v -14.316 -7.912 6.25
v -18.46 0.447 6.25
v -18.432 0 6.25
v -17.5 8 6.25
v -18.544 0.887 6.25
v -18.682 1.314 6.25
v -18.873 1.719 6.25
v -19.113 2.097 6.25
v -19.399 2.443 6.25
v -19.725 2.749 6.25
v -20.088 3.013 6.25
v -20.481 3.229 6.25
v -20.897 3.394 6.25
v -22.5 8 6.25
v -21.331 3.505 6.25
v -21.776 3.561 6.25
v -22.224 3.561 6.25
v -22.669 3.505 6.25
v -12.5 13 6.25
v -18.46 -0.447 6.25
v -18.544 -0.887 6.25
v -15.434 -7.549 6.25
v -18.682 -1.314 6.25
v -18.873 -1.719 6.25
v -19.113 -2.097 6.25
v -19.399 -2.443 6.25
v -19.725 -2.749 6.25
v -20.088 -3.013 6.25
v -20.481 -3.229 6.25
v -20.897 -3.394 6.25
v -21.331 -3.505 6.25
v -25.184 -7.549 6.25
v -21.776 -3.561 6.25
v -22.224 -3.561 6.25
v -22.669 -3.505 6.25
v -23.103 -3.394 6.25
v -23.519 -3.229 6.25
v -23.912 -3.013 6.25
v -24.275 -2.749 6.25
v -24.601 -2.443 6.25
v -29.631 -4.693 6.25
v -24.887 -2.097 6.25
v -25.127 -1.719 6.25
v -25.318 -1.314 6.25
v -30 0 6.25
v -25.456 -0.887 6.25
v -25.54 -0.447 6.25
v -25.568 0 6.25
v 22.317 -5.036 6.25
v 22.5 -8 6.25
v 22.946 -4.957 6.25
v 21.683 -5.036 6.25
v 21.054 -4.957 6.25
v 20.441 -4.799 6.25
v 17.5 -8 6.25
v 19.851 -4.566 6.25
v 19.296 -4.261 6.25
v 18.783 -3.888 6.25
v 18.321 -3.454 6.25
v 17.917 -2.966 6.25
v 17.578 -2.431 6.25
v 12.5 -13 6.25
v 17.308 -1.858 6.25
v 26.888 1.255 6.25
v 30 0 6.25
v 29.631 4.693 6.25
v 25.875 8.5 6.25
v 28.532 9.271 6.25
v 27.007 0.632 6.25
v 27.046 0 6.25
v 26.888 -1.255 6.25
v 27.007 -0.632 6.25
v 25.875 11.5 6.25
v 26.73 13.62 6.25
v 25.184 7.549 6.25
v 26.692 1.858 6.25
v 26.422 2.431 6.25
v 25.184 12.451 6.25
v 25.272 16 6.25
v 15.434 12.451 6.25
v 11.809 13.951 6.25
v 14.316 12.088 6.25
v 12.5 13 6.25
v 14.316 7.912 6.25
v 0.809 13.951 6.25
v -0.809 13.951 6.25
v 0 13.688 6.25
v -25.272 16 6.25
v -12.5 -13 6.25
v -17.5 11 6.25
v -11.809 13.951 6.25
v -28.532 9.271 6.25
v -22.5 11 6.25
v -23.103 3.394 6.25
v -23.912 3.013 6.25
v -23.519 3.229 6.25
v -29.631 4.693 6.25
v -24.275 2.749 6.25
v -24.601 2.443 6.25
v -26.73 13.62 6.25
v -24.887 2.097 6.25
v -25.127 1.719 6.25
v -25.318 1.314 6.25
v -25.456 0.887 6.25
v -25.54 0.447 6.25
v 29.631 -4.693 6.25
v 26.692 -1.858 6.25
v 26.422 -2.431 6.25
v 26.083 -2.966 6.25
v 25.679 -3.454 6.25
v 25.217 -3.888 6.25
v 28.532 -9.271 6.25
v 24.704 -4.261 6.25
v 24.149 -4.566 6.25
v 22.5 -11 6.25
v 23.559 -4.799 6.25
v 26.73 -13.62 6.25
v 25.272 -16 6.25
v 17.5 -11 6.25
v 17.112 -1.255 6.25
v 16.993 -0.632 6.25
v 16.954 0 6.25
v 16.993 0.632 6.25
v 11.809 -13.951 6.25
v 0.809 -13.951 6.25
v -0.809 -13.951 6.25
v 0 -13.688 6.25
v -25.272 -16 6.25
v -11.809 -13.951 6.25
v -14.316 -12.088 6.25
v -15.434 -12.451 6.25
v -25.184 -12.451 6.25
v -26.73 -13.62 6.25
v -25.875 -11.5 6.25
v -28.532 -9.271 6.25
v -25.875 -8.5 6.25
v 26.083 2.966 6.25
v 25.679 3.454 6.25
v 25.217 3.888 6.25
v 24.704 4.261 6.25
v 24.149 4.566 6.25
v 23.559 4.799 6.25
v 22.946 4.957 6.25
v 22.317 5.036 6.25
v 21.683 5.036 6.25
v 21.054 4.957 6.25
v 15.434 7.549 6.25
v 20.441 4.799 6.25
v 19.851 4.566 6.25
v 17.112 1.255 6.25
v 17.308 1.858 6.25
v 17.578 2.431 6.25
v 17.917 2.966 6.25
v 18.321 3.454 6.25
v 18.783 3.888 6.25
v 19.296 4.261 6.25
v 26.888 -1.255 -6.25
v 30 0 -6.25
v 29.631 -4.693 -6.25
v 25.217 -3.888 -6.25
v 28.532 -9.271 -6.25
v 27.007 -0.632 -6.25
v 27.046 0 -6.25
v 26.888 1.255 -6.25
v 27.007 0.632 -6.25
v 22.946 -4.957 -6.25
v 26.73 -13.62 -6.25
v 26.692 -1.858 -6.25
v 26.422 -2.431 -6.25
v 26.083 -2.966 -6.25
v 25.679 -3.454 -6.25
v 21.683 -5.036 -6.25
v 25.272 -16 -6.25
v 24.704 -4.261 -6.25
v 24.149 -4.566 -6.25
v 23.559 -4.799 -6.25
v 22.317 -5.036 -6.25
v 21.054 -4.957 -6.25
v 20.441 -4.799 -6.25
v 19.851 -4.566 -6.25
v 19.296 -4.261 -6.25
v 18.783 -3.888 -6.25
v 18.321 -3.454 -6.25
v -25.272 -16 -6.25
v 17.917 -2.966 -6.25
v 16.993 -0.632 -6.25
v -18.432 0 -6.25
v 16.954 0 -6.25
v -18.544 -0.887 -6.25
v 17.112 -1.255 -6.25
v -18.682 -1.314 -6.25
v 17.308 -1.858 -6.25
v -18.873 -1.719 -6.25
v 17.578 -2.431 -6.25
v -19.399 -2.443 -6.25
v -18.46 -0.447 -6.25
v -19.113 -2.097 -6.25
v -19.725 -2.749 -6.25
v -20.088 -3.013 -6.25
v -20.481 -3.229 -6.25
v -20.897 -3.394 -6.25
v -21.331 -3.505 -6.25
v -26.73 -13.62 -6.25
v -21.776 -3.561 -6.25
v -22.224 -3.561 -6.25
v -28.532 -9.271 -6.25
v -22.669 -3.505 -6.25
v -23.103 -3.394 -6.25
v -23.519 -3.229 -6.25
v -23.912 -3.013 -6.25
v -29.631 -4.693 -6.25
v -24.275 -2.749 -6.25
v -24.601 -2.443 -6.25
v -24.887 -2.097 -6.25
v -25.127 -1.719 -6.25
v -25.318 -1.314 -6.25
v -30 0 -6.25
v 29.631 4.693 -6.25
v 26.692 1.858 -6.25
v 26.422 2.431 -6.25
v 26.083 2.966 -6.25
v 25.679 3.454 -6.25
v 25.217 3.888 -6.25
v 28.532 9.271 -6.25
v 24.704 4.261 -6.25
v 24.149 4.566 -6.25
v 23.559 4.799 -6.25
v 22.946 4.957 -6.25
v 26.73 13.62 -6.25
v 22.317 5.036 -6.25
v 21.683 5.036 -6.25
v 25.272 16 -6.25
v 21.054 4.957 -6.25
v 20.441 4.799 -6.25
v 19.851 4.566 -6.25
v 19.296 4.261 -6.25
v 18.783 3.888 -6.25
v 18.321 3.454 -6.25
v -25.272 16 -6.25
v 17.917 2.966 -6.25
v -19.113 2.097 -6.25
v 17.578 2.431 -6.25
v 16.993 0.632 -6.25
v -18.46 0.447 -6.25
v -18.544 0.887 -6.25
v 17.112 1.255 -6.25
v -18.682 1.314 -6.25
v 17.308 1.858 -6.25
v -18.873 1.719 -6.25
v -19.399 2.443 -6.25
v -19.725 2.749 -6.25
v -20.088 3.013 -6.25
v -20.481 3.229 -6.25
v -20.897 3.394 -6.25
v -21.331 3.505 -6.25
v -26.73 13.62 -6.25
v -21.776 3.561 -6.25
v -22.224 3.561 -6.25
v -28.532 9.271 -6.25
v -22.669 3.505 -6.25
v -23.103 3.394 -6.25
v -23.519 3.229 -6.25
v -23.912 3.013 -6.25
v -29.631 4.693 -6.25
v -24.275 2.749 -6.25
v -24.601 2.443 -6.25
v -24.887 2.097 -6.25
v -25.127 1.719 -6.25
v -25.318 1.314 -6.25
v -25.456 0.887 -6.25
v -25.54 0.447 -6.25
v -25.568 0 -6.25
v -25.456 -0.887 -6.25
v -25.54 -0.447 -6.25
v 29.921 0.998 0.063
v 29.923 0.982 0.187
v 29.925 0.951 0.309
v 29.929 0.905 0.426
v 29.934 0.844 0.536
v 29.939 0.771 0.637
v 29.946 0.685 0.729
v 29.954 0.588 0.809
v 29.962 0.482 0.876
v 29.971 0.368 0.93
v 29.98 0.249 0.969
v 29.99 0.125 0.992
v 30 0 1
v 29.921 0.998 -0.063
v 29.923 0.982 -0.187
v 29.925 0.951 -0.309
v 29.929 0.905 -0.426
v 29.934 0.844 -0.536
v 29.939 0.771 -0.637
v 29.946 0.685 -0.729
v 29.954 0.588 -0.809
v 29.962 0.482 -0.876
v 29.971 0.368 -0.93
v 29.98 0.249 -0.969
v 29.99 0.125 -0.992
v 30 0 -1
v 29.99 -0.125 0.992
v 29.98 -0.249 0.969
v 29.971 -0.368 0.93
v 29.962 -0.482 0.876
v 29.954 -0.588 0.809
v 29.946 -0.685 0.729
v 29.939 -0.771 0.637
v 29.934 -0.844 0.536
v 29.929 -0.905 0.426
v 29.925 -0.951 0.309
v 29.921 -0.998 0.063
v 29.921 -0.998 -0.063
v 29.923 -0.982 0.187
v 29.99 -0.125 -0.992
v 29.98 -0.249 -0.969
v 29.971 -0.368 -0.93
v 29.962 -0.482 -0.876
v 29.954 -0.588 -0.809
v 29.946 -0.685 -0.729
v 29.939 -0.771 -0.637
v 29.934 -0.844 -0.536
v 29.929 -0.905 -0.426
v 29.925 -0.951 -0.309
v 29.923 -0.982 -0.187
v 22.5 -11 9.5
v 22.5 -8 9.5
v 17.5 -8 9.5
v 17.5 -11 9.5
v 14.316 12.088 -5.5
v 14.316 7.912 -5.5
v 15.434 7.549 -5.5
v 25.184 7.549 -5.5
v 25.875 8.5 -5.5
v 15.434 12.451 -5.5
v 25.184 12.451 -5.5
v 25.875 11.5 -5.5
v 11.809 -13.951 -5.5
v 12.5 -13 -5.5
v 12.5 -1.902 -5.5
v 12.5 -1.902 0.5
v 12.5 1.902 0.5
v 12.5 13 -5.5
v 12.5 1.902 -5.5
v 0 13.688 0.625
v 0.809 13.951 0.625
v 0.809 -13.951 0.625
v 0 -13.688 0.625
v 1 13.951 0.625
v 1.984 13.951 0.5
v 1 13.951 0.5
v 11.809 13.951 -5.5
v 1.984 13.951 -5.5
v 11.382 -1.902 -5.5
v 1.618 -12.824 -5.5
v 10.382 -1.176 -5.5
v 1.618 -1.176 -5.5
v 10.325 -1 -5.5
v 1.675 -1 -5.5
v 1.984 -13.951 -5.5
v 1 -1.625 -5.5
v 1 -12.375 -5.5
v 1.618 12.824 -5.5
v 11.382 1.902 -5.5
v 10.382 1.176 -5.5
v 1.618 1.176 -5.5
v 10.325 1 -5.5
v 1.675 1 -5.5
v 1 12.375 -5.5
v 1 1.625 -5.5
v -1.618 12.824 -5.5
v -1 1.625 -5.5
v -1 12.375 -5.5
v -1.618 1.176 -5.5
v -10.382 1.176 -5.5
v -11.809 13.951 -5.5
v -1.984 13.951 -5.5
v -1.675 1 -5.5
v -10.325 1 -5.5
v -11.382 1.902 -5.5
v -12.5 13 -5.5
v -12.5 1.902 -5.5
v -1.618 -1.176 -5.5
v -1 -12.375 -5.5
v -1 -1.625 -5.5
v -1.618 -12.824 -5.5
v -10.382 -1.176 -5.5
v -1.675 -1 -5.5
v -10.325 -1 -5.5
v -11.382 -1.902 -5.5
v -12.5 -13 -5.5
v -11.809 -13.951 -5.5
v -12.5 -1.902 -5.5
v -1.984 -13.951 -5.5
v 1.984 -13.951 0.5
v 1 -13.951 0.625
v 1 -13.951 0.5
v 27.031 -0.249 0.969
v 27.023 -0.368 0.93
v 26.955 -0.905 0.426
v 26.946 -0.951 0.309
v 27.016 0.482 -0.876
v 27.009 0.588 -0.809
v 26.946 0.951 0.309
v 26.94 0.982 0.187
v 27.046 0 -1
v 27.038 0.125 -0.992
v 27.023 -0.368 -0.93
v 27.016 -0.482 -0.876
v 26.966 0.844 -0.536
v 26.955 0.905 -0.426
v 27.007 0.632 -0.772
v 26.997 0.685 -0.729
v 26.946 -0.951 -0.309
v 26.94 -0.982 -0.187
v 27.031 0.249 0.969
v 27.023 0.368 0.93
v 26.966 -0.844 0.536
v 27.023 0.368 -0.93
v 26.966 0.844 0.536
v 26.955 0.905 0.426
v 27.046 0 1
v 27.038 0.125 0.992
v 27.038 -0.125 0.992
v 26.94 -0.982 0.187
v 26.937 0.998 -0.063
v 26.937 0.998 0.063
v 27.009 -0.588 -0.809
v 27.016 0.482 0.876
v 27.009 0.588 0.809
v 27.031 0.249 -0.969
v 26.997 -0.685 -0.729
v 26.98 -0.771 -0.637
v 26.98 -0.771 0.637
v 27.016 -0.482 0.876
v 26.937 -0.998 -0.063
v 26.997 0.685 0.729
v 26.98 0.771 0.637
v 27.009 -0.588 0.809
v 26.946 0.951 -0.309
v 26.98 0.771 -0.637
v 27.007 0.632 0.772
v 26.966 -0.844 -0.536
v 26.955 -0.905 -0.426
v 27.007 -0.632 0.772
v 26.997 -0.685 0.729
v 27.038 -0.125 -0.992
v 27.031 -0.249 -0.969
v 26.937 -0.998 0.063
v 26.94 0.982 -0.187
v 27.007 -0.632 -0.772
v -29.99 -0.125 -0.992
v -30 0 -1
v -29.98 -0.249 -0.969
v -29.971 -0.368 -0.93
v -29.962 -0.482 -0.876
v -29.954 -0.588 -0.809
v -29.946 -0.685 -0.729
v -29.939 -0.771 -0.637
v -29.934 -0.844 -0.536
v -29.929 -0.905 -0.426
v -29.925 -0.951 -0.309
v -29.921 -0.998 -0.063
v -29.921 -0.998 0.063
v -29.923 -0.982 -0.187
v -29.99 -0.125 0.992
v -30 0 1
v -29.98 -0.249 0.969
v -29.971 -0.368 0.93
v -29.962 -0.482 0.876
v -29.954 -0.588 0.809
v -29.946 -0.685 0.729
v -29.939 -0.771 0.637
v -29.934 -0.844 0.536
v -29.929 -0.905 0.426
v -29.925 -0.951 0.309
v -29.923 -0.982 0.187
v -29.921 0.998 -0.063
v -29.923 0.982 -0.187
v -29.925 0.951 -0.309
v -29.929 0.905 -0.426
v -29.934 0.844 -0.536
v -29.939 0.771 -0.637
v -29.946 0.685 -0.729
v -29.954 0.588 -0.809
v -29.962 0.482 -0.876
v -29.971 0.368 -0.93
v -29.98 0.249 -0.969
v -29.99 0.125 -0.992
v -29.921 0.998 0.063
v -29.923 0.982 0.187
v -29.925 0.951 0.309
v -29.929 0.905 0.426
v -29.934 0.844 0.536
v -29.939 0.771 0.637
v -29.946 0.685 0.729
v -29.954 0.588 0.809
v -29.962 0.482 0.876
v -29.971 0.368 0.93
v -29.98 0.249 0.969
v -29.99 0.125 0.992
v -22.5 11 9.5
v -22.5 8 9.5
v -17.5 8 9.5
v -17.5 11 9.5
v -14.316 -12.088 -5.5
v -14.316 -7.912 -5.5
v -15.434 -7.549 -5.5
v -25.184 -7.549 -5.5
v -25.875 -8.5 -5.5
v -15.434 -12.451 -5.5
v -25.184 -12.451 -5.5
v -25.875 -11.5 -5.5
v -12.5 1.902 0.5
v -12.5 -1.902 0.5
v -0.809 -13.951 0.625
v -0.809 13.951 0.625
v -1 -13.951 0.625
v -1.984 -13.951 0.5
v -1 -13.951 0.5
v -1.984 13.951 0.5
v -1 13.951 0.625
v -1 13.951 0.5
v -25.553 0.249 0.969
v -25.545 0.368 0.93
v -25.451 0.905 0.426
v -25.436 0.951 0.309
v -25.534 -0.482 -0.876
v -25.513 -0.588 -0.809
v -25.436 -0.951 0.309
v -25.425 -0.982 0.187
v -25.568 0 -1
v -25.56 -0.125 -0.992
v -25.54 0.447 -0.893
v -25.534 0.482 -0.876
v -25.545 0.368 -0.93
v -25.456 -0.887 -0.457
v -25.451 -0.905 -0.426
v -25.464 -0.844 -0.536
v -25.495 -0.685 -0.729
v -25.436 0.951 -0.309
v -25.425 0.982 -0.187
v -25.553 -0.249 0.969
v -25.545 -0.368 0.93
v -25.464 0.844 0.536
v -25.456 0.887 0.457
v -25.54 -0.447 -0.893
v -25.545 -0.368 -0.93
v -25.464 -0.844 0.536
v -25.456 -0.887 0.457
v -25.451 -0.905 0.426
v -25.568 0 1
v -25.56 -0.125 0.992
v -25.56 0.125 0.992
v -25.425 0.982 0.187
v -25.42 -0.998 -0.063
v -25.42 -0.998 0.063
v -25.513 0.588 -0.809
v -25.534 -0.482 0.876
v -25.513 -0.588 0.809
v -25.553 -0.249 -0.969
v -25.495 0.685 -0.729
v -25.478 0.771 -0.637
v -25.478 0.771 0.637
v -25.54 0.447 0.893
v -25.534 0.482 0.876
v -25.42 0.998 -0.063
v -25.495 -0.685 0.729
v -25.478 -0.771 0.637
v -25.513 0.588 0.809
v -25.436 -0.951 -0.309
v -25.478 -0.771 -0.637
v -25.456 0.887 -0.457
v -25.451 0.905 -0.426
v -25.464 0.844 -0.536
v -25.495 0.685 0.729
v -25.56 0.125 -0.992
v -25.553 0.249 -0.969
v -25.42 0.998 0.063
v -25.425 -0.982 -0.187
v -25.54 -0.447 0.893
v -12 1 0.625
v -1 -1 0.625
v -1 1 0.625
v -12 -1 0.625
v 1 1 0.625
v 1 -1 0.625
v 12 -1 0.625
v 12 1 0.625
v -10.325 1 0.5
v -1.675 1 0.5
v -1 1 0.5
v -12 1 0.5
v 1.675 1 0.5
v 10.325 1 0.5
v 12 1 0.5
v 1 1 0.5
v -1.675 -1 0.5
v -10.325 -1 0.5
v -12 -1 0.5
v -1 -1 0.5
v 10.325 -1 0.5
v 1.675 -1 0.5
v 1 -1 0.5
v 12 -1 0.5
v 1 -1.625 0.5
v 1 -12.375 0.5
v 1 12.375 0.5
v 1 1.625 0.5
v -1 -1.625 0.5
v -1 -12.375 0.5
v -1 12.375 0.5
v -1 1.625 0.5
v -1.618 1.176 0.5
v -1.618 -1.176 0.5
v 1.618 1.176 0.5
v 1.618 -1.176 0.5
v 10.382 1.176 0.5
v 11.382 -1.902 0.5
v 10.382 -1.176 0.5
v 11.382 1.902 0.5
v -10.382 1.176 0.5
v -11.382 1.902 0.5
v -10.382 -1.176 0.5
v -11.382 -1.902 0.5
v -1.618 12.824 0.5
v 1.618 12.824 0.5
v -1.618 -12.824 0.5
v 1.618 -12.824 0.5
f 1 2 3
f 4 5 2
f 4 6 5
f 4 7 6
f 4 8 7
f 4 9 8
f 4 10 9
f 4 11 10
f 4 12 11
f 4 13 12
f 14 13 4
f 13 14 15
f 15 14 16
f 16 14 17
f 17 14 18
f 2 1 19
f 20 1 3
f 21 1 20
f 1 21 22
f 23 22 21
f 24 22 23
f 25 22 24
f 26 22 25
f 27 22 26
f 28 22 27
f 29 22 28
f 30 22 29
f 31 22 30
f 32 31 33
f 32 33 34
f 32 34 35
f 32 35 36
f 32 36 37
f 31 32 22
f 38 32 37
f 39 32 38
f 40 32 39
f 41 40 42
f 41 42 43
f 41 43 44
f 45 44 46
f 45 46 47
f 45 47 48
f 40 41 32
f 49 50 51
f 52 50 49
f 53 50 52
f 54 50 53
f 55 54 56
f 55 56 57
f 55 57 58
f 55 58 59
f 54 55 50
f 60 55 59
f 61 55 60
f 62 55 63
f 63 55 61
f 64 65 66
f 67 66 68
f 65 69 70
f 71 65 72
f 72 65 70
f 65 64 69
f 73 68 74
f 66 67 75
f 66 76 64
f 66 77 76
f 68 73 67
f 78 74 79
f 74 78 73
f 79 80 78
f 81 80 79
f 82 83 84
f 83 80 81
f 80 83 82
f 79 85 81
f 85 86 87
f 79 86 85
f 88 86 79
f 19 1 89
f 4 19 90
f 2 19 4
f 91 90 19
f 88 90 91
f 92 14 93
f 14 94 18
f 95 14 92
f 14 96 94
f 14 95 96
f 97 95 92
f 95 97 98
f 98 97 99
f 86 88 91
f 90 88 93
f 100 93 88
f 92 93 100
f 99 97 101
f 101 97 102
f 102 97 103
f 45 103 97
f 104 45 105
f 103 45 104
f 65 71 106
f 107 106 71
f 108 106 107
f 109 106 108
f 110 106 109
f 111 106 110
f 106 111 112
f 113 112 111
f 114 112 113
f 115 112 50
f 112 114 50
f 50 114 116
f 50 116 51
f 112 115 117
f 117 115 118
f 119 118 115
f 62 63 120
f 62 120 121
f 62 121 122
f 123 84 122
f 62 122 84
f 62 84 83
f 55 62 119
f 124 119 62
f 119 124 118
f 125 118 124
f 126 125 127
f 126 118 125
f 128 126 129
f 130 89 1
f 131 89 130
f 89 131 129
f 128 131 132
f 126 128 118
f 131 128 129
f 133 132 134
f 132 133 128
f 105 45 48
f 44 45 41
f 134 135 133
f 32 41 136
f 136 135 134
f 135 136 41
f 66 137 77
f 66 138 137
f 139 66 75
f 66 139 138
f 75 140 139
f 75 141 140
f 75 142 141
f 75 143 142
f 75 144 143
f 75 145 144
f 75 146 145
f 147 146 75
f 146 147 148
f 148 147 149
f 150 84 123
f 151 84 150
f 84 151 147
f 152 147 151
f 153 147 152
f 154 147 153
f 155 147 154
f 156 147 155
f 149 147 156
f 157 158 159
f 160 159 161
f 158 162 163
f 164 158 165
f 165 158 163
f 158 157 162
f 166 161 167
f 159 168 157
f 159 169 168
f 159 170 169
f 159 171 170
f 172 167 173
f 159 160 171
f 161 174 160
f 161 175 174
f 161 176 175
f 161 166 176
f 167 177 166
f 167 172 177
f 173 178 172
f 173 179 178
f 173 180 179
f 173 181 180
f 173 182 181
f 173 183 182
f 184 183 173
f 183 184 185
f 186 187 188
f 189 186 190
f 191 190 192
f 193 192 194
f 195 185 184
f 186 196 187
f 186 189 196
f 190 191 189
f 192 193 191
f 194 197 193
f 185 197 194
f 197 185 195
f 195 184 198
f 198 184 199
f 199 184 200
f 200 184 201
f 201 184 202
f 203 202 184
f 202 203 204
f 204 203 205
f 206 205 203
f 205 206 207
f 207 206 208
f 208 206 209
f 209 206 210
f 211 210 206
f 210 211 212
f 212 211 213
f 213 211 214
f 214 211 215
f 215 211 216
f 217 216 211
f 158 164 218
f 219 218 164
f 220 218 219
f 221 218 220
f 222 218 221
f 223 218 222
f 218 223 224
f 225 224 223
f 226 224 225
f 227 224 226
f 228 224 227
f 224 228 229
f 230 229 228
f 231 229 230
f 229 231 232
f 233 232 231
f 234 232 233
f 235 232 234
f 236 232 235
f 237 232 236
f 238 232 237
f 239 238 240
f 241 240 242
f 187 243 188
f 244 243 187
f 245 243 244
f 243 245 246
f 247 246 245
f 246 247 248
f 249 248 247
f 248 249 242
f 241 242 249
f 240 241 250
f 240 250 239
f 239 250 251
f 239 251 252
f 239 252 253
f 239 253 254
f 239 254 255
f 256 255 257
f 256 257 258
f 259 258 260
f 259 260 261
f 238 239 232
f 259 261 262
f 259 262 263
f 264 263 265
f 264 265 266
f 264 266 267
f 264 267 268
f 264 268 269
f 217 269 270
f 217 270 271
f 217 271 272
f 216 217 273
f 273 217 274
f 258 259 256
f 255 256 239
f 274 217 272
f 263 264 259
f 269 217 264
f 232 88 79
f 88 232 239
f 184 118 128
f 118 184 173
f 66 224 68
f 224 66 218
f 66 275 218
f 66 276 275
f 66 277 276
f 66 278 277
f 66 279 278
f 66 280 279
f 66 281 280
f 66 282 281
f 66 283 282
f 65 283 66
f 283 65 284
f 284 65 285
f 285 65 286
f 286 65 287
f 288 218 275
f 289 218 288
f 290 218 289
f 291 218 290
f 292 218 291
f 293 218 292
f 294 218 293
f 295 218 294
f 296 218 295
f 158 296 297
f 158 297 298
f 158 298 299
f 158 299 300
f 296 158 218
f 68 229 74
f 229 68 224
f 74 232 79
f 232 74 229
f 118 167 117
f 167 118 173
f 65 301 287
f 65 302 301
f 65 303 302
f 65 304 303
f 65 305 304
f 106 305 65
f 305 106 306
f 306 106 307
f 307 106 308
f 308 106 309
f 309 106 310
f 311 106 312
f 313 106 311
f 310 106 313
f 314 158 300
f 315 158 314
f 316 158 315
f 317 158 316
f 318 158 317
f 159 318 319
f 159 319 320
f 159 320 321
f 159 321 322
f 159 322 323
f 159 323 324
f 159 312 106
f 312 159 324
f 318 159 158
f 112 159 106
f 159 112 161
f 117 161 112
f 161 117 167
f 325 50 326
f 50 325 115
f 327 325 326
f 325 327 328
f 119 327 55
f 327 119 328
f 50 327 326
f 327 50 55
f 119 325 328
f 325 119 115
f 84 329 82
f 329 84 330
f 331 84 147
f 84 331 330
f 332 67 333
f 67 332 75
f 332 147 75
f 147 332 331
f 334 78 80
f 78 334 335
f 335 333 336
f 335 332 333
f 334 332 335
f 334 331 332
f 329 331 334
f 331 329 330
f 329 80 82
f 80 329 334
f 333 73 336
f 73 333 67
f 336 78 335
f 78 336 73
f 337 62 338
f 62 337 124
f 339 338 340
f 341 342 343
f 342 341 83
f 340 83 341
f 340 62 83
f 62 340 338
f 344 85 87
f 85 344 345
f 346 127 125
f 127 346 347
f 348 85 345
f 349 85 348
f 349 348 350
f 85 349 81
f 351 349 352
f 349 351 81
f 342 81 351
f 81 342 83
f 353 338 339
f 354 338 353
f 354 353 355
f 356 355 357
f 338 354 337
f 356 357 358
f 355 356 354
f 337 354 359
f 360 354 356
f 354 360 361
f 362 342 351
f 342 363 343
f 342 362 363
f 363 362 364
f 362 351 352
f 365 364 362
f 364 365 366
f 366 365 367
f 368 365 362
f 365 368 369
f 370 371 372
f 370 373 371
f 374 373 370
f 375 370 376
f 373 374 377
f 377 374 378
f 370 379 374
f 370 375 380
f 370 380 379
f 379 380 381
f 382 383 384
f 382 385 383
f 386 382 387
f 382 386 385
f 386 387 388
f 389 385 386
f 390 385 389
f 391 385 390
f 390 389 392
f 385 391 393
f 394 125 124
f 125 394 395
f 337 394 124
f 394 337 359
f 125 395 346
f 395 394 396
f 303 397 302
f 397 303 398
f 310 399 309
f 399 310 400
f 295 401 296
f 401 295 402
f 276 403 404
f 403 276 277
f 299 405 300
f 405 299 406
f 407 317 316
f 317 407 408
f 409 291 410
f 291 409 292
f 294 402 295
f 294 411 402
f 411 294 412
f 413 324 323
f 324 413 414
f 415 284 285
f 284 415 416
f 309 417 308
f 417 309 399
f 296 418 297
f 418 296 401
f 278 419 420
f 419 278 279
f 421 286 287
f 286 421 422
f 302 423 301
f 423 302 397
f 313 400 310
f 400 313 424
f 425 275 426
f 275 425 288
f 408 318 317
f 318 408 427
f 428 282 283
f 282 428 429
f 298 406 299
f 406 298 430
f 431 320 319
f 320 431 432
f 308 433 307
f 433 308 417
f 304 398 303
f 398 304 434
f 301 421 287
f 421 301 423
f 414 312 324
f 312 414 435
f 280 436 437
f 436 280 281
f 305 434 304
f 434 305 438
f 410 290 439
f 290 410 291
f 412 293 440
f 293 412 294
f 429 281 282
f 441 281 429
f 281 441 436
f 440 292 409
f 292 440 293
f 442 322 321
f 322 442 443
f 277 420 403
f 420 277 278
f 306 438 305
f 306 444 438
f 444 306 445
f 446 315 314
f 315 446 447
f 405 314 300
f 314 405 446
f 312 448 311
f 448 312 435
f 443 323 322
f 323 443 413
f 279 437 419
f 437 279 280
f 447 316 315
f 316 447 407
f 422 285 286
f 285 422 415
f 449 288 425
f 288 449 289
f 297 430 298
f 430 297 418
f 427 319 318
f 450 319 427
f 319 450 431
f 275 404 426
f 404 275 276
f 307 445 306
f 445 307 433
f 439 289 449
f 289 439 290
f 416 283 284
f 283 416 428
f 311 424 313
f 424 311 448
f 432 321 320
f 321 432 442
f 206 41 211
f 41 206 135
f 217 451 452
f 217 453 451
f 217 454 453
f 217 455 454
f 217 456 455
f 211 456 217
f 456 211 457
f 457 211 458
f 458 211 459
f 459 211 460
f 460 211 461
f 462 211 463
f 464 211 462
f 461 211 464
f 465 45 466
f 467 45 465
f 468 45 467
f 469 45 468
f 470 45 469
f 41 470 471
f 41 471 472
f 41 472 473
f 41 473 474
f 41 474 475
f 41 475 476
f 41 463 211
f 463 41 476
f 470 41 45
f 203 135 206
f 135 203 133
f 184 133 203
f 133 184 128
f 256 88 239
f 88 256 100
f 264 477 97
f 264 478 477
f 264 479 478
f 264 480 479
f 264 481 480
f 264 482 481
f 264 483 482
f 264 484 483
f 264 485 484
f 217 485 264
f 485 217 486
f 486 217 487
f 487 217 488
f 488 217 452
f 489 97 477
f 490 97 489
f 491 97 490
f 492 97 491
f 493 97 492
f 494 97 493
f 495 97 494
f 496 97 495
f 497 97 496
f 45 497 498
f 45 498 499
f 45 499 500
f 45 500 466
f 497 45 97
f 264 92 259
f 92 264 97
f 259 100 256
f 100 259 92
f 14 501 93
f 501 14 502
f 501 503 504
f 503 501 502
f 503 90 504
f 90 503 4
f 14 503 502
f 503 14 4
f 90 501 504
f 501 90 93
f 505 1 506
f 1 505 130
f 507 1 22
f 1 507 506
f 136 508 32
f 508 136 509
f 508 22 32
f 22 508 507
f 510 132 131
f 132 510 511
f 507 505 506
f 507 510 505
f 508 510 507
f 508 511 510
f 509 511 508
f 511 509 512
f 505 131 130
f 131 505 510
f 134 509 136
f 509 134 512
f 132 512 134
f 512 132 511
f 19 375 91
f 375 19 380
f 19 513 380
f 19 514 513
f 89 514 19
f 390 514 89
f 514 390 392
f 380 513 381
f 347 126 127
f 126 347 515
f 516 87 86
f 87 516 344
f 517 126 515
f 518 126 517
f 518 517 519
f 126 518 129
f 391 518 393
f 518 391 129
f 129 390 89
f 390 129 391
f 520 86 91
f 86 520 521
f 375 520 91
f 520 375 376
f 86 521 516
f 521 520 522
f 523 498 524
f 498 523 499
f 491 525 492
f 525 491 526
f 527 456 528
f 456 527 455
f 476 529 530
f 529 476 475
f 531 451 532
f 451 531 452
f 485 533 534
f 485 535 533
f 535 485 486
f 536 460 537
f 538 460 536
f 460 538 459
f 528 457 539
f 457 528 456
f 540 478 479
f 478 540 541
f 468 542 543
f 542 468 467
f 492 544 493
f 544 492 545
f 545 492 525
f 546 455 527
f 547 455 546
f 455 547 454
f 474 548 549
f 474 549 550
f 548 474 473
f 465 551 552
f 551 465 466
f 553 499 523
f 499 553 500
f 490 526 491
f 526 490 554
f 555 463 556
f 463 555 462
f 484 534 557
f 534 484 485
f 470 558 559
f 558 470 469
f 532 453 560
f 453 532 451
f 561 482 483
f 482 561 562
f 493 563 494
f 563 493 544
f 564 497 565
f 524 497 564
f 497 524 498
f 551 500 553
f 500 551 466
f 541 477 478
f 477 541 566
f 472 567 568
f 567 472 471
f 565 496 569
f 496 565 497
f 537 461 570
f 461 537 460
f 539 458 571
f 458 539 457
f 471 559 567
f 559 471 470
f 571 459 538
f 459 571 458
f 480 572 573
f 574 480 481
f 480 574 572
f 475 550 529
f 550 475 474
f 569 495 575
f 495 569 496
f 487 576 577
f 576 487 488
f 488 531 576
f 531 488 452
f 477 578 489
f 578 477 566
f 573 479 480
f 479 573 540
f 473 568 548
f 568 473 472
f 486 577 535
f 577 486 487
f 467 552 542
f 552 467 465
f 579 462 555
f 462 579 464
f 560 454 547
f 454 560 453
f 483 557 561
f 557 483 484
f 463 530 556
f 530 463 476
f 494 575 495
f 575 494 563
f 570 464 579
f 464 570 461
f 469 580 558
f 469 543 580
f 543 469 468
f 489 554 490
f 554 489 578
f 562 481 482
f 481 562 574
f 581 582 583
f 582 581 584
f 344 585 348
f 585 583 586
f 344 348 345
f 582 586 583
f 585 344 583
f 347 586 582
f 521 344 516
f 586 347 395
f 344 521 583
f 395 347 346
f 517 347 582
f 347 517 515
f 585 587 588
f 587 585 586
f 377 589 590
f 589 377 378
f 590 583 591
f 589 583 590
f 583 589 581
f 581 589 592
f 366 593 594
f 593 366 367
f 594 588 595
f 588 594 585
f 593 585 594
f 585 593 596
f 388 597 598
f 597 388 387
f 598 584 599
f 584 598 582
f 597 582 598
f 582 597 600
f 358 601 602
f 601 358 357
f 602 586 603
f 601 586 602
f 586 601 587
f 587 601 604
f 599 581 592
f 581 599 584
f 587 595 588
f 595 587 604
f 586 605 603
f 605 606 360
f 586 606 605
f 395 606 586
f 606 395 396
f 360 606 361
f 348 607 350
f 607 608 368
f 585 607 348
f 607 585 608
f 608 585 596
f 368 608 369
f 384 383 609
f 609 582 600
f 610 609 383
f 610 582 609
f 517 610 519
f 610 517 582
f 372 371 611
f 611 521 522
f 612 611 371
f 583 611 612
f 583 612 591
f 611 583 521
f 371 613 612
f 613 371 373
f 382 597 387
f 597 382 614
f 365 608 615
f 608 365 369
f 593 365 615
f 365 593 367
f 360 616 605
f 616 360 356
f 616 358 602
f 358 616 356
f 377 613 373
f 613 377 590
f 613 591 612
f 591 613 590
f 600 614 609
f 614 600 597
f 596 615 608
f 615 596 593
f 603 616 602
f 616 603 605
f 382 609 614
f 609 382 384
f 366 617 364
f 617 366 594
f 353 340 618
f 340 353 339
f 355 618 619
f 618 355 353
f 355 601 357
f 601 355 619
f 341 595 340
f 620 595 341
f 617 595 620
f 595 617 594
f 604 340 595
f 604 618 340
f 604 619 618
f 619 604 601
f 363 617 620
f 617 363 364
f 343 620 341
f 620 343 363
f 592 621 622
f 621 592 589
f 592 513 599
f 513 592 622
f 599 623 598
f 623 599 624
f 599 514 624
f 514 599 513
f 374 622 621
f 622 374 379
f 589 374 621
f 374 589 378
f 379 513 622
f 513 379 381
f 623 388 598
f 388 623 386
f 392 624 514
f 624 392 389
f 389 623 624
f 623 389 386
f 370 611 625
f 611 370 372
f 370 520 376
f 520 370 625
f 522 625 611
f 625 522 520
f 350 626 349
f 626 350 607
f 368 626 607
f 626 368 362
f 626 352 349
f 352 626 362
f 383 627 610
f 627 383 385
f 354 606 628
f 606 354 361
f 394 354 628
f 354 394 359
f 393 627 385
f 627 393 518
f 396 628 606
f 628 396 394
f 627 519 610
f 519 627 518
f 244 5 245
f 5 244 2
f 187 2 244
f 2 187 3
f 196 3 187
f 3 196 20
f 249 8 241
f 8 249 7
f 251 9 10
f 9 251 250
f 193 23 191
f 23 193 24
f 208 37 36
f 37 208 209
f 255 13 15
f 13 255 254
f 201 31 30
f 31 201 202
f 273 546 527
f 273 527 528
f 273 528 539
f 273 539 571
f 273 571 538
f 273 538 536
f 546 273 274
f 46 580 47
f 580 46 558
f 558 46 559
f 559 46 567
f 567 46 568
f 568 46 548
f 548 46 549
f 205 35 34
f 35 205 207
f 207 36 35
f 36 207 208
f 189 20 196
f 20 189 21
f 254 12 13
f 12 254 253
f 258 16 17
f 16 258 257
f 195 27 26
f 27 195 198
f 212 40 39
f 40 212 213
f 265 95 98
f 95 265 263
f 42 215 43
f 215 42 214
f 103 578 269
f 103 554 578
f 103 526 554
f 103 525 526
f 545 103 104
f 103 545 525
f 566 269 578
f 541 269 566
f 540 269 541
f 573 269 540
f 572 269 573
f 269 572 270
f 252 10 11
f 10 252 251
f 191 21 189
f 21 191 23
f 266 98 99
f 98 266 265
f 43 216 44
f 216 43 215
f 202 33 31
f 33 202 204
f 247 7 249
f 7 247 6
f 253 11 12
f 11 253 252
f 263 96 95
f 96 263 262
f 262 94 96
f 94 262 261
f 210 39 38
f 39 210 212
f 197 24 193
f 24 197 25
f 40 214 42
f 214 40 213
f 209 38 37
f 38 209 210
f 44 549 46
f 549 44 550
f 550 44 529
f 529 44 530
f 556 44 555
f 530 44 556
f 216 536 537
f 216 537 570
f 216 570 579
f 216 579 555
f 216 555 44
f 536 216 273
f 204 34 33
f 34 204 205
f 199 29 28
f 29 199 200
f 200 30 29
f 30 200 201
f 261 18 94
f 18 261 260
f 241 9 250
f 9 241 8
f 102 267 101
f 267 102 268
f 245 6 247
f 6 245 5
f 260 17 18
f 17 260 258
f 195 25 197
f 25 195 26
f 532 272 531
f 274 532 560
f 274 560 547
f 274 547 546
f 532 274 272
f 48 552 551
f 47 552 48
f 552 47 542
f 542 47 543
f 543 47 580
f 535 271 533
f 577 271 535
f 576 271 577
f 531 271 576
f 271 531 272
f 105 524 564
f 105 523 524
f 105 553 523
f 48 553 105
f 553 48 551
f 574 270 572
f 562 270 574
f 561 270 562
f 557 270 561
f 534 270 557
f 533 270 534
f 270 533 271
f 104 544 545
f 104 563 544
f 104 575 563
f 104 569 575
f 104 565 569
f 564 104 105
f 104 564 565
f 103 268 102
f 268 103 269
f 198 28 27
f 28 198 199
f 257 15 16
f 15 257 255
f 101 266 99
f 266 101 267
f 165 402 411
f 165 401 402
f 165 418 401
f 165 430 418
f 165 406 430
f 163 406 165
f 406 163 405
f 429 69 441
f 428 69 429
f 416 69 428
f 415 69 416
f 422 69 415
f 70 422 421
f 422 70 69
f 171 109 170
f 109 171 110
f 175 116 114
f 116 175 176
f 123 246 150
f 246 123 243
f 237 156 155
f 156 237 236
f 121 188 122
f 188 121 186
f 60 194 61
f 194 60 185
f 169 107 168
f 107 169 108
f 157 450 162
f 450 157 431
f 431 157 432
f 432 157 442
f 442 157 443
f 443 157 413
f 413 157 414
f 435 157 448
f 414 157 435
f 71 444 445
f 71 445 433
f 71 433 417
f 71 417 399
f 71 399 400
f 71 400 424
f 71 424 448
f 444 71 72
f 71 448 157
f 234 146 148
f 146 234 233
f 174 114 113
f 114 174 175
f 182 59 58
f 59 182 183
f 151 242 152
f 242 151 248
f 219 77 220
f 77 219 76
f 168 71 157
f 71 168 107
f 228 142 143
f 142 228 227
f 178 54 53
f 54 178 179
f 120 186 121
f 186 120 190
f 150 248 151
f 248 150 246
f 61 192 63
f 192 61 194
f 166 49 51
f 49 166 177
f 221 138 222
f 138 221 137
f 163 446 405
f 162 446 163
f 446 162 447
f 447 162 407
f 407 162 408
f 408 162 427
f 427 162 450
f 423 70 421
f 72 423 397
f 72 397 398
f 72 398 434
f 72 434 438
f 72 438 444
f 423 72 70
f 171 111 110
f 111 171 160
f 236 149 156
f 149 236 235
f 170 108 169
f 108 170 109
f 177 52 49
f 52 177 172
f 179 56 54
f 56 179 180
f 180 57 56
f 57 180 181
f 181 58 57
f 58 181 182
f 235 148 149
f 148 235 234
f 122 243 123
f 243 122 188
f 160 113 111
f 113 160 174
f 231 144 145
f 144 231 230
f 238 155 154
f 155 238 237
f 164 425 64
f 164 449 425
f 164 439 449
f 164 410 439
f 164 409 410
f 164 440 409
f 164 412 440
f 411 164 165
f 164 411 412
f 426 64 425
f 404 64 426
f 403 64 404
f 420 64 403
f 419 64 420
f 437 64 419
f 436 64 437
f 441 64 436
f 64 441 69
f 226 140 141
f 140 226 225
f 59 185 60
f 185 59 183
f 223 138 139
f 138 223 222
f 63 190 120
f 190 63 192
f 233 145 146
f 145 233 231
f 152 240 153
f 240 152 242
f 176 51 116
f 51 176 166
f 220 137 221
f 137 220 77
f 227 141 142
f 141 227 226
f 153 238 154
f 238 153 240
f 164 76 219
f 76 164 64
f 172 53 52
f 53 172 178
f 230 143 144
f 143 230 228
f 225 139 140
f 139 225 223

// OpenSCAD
// This thing is a simplified version of the Lee AutoDisk Powder Measure Disk.
// It features customizable hole sizes for fine tuning powder drops.
//
// Warning -- some sanding and fitting will be required.
//
// This is licensed under the creative commons+attribution license
// My design was inspired by SBfarmer and his design at
// http://www.thingiverse.com/thing:2174123
//
// To fulfil the attribution requirement, please link to:
// http://www.thingiverse.com/thing:2160227

/* [Main] */

// Define cavity size calcuation method
shape=0; // [0:Determine Cavity Size Using Volume,1:Determine Cavity Size Using Diameter]

// Body thickness in mm
body_height=12.5;

// Leg length in mm
leg_length=2.5;

// Pocket depth in mm
pocket_depth=10.0;

// Set screw pilot hole diameter in mm
pilot_diameter=2.0;

// Desired volume of first hole in cc (only works if using volume method)
volume01=0.5;

// Desired volume of second hole in cc (only works if using volume method)
volume02=1.0;

// Desired diameter of first hole in mm (only works if using diameter method)
diameter01=5.0;

// Desired diameter of second hole in mm (only works if using diameter method)
diameter02=9.0;

module half_body()
{
	difference()
	{
		union()
		{
			intersection()
			{
				// Define main body of structure
				translate([15,0,0]) cube([30,32,body_height],center=true);

				// Round off end of rectangle
				cylinder(h=12.5,r=30,center=true,$fn=40);
			}

			// Let's grow some legs
			translate([20,-9.5,leg_length+2])  cube([5,3,10],center=true);
		}
		// Cut pocket for slide lever
		#minkowski()
		{
			translate([20,10,0]) cube([9.75,3,pocket_depth+1],center=true);
			cylinder(r=1);
		}
	
		// Hollow out inside of shell
		#translate([0,0,0])
		minkowski()
		{
			translate([06,00,00]) cube([11,26,pocket_depth+1],center=true);
			cylinder(r=1);
		}
		// Drill pilot hole for set screw
		#translate([27,00,00]) rotate([00,90,00]) cylinder(h=10,r=pilot_diameter/2.0,center=true,$fn=50);
	}
}
difference()
{
	union()
	{
		half_body();
		rotate([0,0,180]) half_body();

		// Reinforce hollowed out shell
		translate([0,0,-2.5]) rotate([0,0,90]) cube([2,24,body_height/2],center=true);
		translate([0,0,-2.5]) rotate([0,0,0])  cube([2,30,body_height/2],center=true);

		translate([0,0,-2.5])   cylinder(h=6,r=2,center=true,$fn=10);
		translate([12,0,-2.5])  cylinder(h=6,r=2,center=true,$fn=10);
		translate([-12,0,-2.5]) cylinder(h=6,r=2,center=true,$fn=10);
		translate([0,14,-2.5])  cylinder(h=6,r=2,center=true,$fn=10);
		translate([0,-14,-2.5]) cylinder(h=6,r=2,center=true,$fn=10);
	}
	// Let's make some cavities
	if(shape==0) // Use volume to calculate cavity size
	{
		// Determine cavity radius by multiplying volume in cc by 1000 to get cubic mm and soving for r
		#rotate([0,0,00])  translate([-22,0,0]) cylinder(h=body_height+1,r=sqrt(volume01*1000/(3.1415*body_height)),center=true,$fn=50);
		#rotate([0,0,180]) translate([-22,0,0]) cylinder(h=body_height+1,r=sqrt(volume02*1000/(3.1415*body_height)),center=true,$fn=50);
	}
	if(shape==1) // Use diameter to calculate cavity size
	{
		// Determine cavity radius by dividing diameter by 2
		#rotate([0,0,0])  translate([-22,0,0])  cylinder(h=body_height+1,r=diameter01/2,center=true,$fn=50);
		#rotate([0,0,180]) translate([-22,0,0]) cylinder(h=body_height+1,r=diameter02/2,center=true,$fn=50);
	}
}
